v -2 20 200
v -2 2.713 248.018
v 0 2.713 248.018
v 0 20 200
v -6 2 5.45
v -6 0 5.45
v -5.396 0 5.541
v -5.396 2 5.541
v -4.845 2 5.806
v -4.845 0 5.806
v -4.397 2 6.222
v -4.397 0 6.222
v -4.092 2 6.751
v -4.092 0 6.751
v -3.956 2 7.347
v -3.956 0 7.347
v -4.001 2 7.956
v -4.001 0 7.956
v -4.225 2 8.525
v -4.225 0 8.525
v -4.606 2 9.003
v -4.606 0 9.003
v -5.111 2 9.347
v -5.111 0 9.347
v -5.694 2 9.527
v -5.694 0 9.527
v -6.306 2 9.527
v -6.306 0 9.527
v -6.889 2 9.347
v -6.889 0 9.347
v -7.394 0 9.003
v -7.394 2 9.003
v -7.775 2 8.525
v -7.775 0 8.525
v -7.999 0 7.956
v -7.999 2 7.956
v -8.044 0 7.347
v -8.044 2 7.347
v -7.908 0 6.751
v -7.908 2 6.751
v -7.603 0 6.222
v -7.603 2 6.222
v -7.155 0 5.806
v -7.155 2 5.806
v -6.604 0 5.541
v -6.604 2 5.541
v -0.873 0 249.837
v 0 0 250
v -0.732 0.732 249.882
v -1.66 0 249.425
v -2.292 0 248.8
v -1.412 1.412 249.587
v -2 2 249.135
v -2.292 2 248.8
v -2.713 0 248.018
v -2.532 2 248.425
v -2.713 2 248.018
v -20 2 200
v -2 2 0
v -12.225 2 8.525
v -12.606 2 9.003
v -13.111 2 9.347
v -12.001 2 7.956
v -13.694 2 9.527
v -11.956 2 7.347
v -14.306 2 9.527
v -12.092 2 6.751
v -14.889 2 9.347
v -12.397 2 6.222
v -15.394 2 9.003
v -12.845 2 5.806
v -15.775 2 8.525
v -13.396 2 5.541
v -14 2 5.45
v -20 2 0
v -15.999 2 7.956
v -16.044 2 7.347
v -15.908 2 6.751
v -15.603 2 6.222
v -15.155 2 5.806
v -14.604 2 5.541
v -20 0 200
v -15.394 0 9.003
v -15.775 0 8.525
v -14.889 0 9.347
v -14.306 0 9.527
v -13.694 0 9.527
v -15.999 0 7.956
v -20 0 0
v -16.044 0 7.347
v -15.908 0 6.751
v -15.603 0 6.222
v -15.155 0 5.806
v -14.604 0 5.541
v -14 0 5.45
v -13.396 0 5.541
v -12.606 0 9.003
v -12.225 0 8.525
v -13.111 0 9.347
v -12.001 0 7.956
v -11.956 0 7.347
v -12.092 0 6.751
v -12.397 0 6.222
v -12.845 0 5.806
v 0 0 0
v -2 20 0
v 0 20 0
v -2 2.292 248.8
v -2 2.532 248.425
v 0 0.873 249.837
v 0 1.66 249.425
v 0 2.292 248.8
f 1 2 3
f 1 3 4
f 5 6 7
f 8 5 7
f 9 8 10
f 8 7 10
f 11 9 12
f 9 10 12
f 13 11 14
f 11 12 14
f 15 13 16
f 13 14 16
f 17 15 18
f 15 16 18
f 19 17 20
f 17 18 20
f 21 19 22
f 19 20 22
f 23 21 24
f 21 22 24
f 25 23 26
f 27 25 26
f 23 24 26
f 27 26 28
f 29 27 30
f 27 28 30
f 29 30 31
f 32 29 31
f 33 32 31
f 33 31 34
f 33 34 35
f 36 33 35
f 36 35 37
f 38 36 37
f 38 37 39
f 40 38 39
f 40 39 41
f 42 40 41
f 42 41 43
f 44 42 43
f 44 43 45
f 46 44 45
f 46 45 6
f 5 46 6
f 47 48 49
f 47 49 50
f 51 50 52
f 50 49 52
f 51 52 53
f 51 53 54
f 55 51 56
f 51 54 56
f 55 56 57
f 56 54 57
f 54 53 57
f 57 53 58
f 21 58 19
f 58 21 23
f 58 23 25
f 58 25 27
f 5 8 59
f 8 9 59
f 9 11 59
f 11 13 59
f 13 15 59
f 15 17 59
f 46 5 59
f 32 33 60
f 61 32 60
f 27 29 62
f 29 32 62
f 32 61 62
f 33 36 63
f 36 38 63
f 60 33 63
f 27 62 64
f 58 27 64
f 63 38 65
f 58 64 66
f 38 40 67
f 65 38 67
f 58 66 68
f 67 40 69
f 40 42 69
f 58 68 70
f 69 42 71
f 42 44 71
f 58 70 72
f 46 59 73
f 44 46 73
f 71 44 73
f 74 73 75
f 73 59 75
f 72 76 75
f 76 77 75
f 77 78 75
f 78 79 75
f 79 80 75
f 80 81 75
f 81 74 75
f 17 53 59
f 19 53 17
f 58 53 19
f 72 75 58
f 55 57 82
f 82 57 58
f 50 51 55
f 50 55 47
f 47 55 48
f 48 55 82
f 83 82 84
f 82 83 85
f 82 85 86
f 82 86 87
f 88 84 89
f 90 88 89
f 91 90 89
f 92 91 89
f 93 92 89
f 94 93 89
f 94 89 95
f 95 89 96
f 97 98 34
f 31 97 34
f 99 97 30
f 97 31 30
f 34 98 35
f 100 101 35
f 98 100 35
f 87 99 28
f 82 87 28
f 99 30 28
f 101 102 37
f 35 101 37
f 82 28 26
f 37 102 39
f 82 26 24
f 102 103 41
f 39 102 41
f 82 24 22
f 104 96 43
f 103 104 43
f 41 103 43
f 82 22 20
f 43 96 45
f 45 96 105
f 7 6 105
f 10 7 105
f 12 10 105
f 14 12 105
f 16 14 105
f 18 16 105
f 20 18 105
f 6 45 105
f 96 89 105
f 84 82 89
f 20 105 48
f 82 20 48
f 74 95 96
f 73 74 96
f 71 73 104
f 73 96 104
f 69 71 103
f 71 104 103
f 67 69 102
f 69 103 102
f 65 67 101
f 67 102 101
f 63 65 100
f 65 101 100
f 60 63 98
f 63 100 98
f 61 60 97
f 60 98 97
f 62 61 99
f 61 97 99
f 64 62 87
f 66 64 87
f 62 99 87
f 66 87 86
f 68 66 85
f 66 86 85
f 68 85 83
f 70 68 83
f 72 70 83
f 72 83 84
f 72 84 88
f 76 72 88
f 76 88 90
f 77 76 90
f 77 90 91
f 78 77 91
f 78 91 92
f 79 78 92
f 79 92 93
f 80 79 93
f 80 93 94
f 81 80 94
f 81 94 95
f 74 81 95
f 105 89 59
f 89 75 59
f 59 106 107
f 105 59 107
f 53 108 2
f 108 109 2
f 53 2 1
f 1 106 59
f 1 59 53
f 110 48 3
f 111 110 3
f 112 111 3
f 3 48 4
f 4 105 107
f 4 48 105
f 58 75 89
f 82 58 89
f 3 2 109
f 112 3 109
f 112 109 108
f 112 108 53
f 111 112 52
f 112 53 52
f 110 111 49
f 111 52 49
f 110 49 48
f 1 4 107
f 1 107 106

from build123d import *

# Parameters (mm, degrees)
EXTRUDE_1_DEPTH     = 250
CUT_EXTRUDE_1_DEPTH = 10
CUT_EXTRUDE_2_DEPTH = 10
FILLET_1_R          = 3
SKETCH_5_R          = 2.05
CUT_EXTRUDE_4_DEPTH = 10


with BuildPart() as part:
    # 草图1 → 凸台-拉伸1 (new body)
    with BuildSketch(Plane.XY):
        Polygon((-20, 0), (0, 0), (0, 20), (-2, 20), (-2, 2), (-20, 2), align=None)
    extrude(amount=EXTRUDE_1_DEPTH)

    # 草图2 → 切除-拉伸1 (cut)
    with BuildSketch(Plane.ZY.offset(2)):
        Polygon((250, 2), (200, 20), (250, 20), align=None)
    extrude(amount=-CUT_EXTRUDE_1_DEPTH, mode=Mode.SUBTRACT)

    # 草图3 → 切除-拉伸2 (cut)
    with BuildSketch(Plane(origin=(0, 2, 0), x_dir=(1, 0, 0), z_dir=(0, 1, 0))):
        Polygon((-2, -250), (-20, -200), (-20, -250), align=None)
    extrude(amount=-CUT_EXTRUDE_2_DEPTH, mode=Mode.SUBTRACT)

    # 圆角1
    # the kernel refuses this fillet: 3 mm, written as the material it takes off along each edge
    with BuildSketch(Plane(origin=(-7.265916136, 2, 250), x_dir=(0, -1, 0), z_dir=(1, 0, 0))) as fillet_1_piece_1:
        with BuildLine():
            CenterArc((2.10919491, 2.998012087), FILLET_1_R, 199.798876355, 68.115193721)
            Line((-0.713467325, 1.981853682), (-0.76992057, 1.961530514))
            Line((-0.76992057, 1.961530514), (-0.056453245, -0.020323168))
            Line((-0.056453245, -0.020323168), (0, -0.06))
            ThreePointArc((0, -0.06), (1, -0.06), (1.997816102, -0.059960242))
            Line((1.997816102, -0.059960242), (2, 0))
        make_face()
    extrude(amount=12.531832272, mode=Mode.SUBTRACT)
    with BuildSketch(Plane(origin=(-2, 7.265916136, 250), x_dir=(1, 0, 0), z_dir=(0, -1, 0))) as fillet_1_piece_2:
        with BuildLine():
            CenterArc((2.10919491, -2.998012087), FILLET_1_R, 92.085929924, 68.115193721)
            Line((-0.713467325, -1.981853682), (-0.76992057, -1.961530514))
            Line((-0.76992057, -1.961530514), (-0.056453245, 0.020323168))
            Line((-0.056453245, 0.020323168), (0, 0.06))
            ThreePointArc((0, 0.06), (1, 0.06), (1.997816102, 0.059960242))
            Line((1.997816102, 0.059960242), (2, 0))
        make_face()
    extrude(amount=12.531832272, mode=Mode.SUBTRACT)

    # 草图5 → 切除-拉伸4 (cut)
    with BuildSketch(Plane.XZ):
        with Locations(Location((-14, 7.5, 0), (0, 0, 270))):
            Circle(SKETCH_5_R)
        with Locations(Location((-6, 7.5, 0), (0, 0, 270))):
            Circle(SKETCH_5_R)
    extrude(amount=-CUT_EXTRUDE_4_DEPTH, mode=Mode.SUBTRACT)


solid = part.part
